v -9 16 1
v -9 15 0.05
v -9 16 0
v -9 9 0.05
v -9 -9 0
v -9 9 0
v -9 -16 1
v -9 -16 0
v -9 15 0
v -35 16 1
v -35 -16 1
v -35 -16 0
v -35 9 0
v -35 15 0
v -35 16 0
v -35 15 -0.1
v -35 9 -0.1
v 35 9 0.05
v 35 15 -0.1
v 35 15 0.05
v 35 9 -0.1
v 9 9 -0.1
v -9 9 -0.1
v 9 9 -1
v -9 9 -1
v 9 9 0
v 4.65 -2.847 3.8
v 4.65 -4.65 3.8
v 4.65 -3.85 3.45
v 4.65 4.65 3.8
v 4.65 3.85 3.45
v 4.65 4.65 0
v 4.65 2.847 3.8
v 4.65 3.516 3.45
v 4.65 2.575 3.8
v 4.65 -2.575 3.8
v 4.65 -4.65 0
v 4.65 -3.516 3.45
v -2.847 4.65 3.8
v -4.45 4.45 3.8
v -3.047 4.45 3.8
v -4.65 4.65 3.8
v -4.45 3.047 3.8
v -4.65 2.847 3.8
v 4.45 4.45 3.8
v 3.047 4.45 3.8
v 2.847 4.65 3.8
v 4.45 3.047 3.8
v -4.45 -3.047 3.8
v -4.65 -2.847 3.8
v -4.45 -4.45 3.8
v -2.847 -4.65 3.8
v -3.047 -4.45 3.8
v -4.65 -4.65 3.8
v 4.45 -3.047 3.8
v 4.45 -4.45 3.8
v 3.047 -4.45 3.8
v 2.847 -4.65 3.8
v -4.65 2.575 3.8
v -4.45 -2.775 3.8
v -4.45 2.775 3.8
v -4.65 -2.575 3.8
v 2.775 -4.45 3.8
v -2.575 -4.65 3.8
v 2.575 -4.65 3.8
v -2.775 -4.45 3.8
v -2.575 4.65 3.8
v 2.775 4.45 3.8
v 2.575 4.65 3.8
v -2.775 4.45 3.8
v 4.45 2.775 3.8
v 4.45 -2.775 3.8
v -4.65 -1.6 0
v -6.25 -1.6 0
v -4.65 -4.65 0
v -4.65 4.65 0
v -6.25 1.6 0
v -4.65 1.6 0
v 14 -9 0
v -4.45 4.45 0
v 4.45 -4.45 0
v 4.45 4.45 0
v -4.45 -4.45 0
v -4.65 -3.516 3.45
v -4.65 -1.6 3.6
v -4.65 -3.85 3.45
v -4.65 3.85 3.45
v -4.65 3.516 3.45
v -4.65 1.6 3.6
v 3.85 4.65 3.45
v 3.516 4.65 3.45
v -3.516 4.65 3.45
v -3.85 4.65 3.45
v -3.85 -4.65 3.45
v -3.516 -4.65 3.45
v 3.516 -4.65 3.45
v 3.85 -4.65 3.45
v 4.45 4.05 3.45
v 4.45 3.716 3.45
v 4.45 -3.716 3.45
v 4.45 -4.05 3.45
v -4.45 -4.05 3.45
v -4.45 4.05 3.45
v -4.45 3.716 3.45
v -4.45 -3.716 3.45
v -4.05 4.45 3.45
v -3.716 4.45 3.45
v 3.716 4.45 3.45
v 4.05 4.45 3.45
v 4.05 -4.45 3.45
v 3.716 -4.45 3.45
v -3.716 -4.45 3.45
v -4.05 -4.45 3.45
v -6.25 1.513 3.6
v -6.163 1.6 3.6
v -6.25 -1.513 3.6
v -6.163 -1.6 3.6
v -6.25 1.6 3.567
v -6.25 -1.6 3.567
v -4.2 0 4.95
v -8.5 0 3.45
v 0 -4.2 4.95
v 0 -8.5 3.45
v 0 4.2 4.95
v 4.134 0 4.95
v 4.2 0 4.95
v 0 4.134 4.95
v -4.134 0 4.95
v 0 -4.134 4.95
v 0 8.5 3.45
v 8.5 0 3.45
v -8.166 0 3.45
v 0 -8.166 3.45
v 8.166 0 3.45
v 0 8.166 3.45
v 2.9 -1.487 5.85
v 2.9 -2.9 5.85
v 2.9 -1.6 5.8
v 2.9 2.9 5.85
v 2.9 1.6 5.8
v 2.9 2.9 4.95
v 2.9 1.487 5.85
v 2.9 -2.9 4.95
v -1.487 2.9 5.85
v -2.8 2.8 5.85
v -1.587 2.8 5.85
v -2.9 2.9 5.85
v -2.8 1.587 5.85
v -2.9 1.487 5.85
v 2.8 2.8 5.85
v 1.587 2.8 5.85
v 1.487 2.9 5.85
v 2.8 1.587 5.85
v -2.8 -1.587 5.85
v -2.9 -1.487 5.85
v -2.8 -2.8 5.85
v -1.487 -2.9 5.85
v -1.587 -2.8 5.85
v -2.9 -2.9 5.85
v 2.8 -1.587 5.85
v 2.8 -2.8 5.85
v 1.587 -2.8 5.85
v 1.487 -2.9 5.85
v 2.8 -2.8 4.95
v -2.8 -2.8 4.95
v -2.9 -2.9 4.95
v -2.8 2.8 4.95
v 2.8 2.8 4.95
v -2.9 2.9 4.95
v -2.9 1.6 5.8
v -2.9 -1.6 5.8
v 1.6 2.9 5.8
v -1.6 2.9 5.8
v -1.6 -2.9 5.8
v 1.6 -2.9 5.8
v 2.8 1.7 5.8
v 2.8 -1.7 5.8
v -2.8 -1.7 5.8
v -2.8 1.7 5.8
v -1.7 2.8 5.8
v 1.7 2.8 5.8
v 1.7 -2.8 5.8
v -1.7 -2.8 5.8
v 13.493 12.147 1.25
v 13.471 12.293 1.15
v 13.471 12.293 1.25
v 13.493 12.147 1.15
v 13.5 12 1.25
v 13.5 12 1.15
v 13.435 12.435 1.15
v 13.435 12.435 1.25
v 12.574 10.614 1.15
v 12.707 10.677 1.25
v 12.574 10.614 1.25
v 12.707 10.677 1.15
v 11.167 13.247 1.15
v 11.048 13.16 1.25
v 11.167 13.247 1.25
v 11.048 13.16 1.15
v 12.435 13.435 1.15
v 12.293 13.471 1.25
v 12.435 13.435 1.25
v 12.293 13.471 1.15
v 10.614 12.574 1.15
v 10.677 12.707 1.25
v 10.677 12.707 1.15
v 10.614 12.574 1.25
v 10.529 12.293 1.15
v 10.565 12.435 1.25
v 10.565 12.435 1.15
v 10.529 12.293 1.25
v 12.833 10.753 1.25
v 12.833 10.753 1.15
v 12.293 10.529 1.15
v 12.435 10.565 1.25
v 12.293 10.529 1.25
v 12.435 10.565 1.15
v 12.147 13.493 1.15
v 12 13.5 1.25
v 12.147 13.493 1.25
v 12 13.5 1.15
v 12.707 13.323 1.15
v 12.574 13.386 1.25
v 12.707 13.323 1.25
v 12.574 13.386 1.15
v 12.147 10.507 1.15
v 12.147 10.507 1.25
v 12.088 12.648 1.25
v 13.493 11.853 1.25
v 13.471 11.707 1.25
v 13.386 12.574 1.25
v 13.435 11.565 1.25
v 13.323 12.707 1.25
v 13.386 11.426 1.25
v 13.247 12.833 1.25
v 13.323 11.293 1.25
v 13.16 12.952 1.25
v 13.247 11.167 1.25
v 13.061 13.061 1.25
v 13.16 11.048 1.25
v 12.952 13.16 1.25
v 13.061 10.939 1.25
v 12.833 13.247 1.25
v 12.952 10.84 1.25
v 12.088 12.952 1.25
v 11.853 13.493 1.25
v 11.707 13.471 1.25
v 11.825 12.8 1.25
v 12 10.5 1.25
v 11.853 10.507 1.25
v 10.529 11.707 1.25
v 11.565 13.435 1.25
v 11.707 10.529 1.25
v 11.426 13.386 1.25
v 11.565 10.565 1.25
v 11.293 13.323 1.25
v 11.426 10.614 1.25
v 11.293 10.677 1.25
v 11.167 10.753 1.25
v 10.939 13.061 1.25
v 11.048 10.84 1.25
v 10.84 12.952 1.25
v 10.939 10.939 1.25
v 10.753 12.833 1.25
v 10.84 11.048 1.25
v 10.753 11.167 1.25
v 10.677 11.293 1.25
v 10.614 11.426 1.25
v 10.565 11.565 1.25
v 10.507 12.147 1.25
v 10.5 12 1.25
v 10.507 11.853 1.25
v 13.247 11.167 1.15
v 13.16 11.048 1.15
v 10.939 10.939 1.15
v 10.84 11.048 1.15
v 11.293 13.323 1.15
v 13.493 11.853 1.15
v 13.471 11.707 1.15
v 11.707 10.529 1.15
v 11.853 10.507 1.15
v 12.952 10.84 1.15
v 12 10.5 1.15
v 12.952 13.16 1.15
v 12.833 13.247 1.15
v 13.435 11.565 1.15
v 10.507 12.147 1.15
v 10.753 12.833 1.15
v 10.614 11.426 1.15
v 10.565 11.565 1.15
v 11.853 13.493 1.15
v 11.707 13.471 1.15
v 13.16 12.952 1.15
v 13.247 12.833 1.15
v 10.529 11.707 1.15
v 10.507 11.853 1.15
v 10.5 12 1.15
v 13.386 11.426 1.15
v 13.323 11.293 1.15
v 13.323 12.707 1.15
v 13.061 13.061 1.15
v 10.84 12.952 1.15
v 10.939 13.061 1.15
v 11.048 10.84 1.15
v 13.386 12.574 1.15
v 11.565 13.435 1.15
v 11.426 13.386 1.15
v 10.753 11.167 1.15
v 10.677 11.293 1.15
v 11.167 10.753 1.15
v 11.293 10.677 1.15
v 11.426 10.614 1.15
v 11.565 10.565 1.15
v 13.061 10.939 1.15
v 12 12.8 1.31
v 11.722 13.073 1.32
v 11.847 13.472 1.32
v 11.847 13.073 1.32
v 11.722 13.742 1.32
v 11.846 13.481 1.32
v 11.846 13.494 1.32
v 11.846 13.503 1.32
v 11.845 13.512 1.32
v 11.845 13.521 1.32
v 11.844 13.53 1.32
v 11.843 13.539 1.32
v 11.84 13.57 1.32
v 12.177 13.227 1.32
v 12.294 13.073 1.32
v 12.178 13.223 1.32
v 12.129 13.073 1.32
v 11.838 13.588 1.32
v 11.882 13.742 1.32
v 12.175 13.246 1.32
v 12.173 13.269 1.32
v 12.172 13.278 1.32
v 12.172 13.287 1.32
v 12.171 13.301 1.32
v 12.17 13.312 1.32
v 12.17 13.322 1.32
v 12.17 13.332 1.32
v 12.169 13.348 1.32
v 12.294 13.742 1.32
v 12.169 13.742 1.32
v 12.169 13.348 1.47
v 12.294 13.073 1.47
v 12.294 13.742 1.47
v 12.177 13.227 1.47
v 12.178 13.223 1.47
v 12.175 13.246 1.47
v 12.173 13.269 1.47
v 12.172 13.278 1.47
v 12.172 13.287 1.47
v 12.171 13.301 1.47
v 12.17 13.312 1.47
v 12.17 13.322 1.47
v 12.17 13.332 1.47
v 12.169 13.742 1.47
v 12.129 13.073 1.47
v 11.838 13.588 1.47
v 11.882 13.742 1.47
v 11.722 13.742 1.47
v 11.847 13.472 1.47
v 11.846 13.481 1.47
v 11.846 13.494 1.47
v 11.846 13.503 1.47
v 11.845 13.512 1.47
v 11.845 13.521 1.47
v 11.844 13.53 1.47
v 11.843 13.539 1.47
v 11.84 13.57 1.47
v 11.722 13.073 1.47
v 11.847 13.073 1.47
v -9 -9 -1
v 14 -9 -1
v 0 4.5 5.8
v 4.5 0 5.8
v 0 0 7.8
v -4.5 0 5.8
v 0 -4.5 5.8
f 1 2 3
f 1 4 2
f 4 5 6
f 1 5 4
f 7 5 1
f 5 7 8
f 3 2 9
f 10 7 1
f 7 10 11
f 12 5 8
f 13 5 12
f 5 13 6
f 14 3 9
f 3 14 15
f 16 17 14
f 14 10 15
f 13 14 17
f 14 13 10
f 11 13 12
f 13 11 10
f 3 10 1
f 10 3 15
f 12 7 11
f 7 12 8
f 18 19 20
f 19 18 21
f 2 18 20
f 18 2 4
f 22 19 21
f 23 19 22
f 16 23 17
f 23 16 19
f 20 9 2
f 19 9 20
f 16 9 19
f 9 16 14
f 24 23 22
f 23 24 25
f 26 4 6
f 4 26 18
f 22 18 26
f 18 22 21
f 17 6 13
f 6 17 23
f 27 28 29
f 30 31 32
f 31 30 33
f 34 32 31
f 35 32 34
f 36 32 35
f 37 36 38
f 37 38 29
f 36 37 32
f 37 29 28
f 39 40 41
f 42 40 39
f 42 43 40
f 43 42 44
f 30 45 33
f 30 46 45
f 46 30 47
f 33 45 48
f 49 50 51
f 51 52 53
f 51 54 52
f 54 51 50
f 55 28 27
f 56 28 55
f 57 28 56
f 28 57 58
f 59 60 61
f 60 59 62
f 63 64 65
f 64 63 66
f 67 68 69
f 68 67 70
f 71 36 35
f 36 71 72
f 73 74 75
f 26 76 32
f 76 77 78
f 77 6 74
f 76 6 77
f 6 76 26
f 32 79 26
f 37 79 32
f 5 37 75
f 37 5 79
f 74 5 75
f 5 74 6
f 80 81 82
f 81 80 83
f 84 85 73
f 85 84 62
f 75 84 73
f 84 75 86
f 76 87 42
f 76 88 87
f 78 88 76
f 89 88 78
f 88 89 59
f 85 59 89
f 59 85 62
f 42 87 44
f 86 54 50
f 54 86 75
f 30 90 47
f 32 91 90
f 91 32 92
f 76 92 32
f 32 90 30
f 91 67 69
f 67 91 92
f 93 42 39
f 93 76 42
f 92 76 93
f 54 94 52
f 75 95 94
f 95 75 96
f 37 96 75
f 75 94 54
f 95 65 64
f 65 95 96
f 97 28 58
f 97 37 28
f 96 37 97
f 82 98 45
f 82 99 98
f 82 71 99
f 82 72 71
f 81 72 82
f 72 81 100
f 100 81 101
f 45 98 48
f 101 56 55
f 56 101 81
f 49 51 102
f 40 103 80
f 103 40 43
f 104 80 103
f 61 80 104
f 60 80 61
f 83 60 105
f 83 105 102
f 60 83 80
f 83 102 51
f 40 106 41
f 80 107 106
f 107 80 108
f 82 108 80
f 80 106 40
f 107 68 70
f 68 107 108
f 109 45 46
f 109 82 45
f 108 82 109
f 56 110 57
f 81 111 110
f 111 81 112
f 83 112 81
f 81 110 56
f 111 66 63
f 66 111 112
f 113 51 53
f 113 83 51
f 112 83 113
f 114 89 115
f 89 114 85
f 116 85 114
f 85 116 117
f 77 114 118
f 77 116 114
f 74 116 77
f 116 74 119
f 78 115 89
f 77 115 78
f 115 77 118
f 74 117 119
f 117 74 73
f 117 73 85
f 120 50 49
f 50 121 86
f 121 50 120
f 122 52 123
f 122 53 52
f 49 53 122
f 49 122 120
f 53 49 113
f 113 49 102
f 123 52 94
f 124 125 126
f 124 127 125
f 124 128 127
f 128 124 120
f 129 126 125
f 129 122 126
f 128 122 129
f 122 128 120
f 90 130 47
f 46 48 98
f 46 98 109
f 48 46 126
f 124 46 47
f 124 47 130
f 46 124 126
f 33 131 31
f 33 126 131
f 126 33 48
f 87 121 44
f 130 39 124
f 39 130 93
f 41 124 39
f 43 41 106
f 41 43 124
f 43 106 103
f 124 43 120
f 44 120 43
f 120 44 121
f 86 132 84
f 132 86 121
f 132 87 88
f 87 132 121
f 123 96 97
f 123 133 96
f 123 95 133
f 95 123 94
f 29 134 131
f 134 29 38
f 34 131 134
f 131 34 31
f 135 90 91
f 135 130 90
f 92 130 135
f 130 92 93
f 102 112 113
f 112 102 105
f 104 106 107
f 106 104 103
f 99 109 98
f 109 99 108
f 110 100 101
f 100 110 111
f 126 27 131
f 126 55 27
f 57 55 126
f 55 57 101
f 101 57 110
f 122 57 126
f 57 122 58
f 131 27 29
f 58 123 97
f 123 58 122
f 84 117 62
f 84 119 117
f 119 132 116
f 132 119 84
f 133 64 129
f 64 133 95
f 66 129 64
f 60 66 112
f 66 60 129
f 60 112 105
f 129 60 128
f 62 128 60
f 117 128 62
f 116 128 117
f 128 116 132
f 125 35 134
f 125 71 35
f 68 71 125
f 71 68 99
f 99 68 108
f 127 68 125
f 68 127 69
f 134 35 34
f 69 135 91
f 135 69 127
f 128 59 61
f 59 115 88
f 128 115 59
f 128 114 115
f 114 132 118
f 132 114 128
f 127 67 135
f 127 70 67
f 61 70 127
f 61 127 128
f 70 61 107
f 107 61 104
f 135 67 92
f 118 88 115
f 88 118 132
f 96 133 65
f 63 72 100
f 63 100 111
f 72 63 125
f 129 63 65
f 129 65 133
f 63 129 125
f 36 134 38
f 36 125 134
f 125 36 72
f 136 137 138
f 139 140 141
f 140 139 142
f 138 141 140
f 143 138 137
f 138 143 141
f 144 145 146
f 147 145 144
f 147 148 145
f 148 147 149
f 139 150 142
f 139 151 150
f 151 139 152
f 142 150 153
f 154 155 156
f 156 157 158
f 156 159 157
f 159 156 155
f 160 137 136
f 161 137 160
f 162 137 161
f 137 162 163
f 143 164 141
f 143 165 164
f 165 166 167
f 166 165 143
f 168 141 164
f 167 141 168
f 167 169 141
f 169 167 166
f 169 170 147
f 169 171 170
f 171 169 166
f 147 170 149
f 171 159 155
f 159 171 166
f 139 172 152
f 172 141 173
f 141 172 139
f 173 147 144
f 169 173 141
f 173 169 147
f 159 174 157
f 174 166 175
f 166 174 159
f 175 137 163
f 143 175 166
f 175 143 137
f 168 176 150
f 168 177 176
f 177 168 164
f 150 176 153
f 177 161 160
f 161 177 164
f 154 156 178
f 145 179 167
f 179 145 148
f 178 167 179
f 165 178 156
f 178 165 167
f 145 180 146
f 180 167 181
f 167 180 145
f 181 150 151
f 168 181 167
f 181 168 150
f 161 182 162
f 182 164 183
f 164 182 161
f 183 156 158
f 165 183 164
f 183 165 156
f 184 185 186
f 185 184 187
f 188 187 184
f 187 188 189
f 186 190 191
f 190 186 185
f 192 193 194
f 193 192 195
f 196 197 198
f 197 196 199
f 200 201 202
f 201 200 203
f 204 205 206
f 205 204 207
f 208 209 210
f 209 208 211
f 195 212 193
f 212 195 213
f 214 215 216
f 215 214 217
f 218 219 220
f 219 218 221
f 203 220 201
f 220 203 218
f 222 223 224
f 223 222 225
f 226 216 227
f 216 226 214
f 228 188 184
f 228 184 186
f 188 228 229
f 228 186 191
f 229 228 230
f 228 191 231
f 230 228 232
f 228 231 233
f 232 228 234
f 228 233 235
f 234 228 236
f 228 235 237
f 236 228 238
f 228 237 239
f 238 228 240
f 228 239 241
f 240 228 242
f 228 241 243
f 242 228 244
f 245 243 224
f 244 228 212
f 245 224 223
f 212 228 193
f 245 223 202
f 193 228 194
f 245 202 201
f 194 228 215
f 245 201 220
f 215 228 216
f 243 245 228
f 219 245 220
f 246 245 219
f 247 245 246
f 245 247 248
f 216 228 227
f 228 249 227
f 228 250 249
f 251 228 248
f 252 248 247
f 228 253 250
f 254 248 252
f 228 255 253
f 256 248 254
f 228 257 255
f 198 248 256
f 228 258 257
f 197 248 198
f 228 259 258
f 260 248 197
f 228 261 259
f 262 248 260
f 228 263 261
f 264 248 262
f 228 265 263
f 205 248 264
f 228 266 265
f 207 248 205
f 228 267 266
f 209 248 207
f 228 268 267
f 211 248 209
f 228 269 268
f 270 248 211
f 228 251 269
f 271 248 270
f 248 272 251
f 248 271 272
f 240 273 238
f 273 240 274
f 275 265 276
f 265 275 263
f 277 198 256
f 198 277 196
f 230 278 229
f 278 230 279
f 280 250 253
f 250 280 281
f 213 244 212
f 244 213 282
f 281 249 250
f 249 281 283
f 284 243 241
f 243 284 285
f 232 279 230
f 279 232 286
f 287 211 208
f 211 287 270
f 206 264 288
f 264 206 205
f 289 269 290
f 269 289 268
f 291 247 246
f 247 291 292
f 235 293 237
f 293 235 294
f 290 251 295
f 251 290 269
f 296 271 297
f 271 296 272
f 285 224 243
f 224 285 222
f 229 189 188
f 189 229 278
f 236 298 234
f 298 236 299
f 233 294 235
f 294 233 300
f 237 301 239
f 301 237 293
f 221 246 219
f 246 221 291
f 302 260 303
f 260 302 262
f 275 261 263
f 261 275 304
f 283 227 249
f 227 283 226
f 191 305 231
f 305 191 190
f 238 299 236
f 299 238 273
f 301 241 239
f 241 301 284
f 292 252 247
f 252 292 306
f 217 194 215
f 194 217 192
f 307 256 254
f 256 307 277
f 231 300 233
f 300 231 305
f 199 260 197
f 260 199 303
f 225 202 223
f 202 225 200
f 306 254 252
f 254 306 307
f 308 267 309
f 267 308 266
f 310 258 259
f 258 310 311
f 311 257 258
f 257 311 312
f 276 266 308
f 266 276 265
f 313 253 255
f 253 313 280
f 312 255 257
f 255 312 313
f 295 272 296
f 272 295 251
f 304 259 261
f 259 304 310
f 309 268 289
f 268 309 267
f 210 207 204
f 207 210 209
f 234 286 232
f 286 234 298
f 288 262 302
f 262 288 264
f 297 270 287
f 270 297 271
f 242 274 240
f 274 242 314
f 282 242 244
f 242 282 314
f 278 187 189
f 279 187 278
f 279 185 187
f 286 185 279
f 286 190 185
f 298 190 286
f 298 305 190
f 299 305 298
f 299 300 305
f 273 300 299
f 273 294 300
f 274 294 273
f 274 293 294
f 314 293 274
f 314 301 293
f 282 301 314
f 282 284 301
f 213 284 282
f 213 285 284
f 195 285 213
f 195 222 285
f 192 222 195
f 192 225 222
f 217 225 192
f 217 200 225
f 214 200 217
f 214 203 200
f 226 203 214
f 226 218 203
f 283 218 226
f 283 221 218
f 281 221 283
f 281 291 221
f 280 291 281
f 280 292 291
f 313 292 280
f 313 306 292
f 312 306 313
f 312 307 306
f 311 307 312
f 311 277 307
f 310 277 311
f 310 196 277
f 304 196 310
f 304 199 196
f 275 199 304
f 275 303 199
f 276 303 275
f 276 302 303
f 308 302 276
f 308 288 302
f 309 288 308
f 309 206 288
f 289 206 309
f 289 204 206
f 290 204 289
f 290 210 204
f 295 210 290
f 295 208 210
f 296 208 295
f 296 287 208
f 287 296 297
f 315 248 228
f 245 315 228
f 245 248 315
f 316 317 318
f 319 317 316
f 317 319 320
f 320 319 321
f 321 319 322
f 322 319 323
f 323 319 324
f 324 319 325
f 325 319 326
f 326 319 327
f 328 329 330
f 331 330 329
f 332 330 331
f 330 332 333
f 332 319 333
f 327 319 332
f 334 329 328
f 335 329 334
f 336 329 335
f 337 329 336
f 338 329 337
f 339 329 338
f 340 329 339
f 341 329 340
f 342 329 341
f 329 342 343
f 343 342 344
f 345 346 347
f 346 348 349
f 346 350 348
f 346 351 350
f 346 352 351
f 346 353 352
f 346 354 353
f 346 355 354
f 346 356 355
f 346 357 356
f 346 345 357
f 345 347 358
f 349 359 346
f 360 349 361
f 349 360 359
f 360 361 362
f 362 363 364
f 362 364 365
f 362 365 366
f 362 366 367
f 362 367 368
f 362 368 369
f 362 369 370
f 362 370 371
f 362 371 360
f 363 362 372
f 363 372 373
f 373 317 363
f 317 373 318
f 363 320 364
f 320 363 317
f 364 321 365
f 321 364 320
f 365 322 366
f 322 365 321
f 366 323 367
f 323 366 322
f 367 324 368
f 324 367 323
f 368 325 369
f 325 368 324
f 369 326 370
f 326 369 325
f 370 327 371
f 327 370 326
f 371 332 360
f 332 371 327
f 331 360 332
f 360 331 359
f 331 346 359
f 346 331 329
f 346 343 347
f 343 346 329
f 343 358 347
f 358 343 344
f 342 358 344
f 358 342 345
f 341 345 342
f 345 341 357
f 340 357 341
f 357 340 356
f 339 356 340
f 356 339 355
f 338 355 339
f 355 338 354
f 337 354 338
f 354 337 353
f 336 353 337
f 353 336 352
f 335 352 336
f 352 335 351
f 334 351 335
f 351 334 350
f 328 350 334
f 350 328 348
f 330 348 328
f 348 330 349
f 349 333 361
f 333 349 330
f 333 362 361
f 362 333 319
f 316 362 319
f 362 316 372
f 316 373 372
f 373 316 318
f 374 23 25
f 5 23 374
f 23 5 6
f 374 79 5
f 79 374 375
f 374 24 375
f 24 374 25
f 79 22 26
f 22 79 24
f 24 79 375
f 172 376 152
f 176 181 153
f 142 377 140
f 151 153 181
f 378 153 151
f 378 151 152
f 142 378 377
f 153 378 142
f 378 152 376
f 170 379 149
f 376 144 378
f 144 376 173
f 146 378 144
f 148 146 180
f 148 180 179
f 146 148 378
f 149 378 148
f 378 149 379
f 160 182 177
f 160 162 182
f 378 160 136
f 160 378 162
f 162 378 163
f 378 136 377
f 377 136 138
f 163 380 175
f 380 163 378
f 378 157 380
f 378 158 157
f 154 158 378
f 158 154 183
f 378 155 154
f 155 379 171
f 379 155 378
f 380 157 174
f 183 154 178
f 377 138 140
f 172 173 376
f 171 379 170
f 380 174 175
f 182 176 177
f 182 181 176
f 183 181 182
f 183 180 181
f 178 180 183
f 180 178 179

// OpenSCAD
// =============================================================================================================
// MASJID NURUL FALAH SUKATANI — STEP 09: LIMASAN ROOF COVER & CLERESTORY GLASS
// Parametric Architectural CSG Model (OpenSCAD)
//
// STRICT CIVIL MANDATE: NORTH AT TOP (+Y AXIS)
// 2-TIER ROOF COVER WITH ARCHITECTURAL CLERESTORY VENTILATION APERTURES
// =============================================================================================================

$fn = 64;

poly_site = [ [-9, -9], [14, -9], [9, 9], [-9, 9] ];

module surroundings() {
    color([0.22, 0.42, 0.24]) translate([-22, 0, 0.5]) cube([26, 32, 1.0], center = true);
    color([0.18, 0.20, 0.24]) translate([-35, 9, -0.10]) cube([70, 6.0, 0.15]);
    
}

module step_09_assembly() {
    surroundings();
    color([0.28, 0.52, 0.30]) translate([0, 0, -1.0]) linear_extrude(height = 1.0) polygon(poly_site);
    color([0.88, 0.88, 0.85]) {
        difference() {
            translate([0, 0, 1.9]) cube([9.3, 9.3, 3.8], center = true);
            translate([0, 0, 1.9]) cube([8.9, 8.9, 4.0], center = true);
        }
        translate([-5.45, 0, 1.8]) cube([1.6, 3.2, 3.6], center = true);
    }
    // Tier 1 Sloped Roof
    color([0.22, 0.24, 0.28]) {
        translate([0, 0, 4.2])
            difference() {
                cylinder(h = 1.5, r1 = 8.5, r2 = 4.2, $fn = 4, center = true);
                cylinder(h = 1.6, r1 = 8.3, r2 = 4.0, $fn = 4, center = true);
            }
    }
    // Clerestory Windows with Louvers
    color([0.3, 0.8, 0.9, 0.7]) {
        translate([0, 0, 5.4])
            difference() {
                cube([5.8, 5.8, 0.9], center = true);
                cube([5.6, 5.6, 1.0], center = true);
            }
    }
    // Tier 2 Limasan Pyramid Roof
    color([0.18, 0.20, 0.24]) {
        translate([0, 0, 6.8])
            cylinder(h = 2.0, r1 = 4.5, r2 = 0.0, $fn = 4, center = true);
    }
    // Compass Rose
    translate([12, 12, 1.2]) {
        color([0.0, 0.75, 0.95]) cylinder(h = 0.10, r = 1.5, center = true);
        color([0.95, 0.2, 0.2]) translate([0, 0.8, 0.05]) rotate([0, 0, 180]) cylinder(h = 0.12, r1 = 0.35, r2 = 0.0, $fn = 3, center = true);
        color([0.9, 0.9, 0.9]) translate([0, 1.4, 0.12]) linear_extrude(height = 0.15) text("N", size = 0.7, font = "Liberation Sans:style=Bold", halign = "center", valign = "center");
    }
}

step_09_assembly();
